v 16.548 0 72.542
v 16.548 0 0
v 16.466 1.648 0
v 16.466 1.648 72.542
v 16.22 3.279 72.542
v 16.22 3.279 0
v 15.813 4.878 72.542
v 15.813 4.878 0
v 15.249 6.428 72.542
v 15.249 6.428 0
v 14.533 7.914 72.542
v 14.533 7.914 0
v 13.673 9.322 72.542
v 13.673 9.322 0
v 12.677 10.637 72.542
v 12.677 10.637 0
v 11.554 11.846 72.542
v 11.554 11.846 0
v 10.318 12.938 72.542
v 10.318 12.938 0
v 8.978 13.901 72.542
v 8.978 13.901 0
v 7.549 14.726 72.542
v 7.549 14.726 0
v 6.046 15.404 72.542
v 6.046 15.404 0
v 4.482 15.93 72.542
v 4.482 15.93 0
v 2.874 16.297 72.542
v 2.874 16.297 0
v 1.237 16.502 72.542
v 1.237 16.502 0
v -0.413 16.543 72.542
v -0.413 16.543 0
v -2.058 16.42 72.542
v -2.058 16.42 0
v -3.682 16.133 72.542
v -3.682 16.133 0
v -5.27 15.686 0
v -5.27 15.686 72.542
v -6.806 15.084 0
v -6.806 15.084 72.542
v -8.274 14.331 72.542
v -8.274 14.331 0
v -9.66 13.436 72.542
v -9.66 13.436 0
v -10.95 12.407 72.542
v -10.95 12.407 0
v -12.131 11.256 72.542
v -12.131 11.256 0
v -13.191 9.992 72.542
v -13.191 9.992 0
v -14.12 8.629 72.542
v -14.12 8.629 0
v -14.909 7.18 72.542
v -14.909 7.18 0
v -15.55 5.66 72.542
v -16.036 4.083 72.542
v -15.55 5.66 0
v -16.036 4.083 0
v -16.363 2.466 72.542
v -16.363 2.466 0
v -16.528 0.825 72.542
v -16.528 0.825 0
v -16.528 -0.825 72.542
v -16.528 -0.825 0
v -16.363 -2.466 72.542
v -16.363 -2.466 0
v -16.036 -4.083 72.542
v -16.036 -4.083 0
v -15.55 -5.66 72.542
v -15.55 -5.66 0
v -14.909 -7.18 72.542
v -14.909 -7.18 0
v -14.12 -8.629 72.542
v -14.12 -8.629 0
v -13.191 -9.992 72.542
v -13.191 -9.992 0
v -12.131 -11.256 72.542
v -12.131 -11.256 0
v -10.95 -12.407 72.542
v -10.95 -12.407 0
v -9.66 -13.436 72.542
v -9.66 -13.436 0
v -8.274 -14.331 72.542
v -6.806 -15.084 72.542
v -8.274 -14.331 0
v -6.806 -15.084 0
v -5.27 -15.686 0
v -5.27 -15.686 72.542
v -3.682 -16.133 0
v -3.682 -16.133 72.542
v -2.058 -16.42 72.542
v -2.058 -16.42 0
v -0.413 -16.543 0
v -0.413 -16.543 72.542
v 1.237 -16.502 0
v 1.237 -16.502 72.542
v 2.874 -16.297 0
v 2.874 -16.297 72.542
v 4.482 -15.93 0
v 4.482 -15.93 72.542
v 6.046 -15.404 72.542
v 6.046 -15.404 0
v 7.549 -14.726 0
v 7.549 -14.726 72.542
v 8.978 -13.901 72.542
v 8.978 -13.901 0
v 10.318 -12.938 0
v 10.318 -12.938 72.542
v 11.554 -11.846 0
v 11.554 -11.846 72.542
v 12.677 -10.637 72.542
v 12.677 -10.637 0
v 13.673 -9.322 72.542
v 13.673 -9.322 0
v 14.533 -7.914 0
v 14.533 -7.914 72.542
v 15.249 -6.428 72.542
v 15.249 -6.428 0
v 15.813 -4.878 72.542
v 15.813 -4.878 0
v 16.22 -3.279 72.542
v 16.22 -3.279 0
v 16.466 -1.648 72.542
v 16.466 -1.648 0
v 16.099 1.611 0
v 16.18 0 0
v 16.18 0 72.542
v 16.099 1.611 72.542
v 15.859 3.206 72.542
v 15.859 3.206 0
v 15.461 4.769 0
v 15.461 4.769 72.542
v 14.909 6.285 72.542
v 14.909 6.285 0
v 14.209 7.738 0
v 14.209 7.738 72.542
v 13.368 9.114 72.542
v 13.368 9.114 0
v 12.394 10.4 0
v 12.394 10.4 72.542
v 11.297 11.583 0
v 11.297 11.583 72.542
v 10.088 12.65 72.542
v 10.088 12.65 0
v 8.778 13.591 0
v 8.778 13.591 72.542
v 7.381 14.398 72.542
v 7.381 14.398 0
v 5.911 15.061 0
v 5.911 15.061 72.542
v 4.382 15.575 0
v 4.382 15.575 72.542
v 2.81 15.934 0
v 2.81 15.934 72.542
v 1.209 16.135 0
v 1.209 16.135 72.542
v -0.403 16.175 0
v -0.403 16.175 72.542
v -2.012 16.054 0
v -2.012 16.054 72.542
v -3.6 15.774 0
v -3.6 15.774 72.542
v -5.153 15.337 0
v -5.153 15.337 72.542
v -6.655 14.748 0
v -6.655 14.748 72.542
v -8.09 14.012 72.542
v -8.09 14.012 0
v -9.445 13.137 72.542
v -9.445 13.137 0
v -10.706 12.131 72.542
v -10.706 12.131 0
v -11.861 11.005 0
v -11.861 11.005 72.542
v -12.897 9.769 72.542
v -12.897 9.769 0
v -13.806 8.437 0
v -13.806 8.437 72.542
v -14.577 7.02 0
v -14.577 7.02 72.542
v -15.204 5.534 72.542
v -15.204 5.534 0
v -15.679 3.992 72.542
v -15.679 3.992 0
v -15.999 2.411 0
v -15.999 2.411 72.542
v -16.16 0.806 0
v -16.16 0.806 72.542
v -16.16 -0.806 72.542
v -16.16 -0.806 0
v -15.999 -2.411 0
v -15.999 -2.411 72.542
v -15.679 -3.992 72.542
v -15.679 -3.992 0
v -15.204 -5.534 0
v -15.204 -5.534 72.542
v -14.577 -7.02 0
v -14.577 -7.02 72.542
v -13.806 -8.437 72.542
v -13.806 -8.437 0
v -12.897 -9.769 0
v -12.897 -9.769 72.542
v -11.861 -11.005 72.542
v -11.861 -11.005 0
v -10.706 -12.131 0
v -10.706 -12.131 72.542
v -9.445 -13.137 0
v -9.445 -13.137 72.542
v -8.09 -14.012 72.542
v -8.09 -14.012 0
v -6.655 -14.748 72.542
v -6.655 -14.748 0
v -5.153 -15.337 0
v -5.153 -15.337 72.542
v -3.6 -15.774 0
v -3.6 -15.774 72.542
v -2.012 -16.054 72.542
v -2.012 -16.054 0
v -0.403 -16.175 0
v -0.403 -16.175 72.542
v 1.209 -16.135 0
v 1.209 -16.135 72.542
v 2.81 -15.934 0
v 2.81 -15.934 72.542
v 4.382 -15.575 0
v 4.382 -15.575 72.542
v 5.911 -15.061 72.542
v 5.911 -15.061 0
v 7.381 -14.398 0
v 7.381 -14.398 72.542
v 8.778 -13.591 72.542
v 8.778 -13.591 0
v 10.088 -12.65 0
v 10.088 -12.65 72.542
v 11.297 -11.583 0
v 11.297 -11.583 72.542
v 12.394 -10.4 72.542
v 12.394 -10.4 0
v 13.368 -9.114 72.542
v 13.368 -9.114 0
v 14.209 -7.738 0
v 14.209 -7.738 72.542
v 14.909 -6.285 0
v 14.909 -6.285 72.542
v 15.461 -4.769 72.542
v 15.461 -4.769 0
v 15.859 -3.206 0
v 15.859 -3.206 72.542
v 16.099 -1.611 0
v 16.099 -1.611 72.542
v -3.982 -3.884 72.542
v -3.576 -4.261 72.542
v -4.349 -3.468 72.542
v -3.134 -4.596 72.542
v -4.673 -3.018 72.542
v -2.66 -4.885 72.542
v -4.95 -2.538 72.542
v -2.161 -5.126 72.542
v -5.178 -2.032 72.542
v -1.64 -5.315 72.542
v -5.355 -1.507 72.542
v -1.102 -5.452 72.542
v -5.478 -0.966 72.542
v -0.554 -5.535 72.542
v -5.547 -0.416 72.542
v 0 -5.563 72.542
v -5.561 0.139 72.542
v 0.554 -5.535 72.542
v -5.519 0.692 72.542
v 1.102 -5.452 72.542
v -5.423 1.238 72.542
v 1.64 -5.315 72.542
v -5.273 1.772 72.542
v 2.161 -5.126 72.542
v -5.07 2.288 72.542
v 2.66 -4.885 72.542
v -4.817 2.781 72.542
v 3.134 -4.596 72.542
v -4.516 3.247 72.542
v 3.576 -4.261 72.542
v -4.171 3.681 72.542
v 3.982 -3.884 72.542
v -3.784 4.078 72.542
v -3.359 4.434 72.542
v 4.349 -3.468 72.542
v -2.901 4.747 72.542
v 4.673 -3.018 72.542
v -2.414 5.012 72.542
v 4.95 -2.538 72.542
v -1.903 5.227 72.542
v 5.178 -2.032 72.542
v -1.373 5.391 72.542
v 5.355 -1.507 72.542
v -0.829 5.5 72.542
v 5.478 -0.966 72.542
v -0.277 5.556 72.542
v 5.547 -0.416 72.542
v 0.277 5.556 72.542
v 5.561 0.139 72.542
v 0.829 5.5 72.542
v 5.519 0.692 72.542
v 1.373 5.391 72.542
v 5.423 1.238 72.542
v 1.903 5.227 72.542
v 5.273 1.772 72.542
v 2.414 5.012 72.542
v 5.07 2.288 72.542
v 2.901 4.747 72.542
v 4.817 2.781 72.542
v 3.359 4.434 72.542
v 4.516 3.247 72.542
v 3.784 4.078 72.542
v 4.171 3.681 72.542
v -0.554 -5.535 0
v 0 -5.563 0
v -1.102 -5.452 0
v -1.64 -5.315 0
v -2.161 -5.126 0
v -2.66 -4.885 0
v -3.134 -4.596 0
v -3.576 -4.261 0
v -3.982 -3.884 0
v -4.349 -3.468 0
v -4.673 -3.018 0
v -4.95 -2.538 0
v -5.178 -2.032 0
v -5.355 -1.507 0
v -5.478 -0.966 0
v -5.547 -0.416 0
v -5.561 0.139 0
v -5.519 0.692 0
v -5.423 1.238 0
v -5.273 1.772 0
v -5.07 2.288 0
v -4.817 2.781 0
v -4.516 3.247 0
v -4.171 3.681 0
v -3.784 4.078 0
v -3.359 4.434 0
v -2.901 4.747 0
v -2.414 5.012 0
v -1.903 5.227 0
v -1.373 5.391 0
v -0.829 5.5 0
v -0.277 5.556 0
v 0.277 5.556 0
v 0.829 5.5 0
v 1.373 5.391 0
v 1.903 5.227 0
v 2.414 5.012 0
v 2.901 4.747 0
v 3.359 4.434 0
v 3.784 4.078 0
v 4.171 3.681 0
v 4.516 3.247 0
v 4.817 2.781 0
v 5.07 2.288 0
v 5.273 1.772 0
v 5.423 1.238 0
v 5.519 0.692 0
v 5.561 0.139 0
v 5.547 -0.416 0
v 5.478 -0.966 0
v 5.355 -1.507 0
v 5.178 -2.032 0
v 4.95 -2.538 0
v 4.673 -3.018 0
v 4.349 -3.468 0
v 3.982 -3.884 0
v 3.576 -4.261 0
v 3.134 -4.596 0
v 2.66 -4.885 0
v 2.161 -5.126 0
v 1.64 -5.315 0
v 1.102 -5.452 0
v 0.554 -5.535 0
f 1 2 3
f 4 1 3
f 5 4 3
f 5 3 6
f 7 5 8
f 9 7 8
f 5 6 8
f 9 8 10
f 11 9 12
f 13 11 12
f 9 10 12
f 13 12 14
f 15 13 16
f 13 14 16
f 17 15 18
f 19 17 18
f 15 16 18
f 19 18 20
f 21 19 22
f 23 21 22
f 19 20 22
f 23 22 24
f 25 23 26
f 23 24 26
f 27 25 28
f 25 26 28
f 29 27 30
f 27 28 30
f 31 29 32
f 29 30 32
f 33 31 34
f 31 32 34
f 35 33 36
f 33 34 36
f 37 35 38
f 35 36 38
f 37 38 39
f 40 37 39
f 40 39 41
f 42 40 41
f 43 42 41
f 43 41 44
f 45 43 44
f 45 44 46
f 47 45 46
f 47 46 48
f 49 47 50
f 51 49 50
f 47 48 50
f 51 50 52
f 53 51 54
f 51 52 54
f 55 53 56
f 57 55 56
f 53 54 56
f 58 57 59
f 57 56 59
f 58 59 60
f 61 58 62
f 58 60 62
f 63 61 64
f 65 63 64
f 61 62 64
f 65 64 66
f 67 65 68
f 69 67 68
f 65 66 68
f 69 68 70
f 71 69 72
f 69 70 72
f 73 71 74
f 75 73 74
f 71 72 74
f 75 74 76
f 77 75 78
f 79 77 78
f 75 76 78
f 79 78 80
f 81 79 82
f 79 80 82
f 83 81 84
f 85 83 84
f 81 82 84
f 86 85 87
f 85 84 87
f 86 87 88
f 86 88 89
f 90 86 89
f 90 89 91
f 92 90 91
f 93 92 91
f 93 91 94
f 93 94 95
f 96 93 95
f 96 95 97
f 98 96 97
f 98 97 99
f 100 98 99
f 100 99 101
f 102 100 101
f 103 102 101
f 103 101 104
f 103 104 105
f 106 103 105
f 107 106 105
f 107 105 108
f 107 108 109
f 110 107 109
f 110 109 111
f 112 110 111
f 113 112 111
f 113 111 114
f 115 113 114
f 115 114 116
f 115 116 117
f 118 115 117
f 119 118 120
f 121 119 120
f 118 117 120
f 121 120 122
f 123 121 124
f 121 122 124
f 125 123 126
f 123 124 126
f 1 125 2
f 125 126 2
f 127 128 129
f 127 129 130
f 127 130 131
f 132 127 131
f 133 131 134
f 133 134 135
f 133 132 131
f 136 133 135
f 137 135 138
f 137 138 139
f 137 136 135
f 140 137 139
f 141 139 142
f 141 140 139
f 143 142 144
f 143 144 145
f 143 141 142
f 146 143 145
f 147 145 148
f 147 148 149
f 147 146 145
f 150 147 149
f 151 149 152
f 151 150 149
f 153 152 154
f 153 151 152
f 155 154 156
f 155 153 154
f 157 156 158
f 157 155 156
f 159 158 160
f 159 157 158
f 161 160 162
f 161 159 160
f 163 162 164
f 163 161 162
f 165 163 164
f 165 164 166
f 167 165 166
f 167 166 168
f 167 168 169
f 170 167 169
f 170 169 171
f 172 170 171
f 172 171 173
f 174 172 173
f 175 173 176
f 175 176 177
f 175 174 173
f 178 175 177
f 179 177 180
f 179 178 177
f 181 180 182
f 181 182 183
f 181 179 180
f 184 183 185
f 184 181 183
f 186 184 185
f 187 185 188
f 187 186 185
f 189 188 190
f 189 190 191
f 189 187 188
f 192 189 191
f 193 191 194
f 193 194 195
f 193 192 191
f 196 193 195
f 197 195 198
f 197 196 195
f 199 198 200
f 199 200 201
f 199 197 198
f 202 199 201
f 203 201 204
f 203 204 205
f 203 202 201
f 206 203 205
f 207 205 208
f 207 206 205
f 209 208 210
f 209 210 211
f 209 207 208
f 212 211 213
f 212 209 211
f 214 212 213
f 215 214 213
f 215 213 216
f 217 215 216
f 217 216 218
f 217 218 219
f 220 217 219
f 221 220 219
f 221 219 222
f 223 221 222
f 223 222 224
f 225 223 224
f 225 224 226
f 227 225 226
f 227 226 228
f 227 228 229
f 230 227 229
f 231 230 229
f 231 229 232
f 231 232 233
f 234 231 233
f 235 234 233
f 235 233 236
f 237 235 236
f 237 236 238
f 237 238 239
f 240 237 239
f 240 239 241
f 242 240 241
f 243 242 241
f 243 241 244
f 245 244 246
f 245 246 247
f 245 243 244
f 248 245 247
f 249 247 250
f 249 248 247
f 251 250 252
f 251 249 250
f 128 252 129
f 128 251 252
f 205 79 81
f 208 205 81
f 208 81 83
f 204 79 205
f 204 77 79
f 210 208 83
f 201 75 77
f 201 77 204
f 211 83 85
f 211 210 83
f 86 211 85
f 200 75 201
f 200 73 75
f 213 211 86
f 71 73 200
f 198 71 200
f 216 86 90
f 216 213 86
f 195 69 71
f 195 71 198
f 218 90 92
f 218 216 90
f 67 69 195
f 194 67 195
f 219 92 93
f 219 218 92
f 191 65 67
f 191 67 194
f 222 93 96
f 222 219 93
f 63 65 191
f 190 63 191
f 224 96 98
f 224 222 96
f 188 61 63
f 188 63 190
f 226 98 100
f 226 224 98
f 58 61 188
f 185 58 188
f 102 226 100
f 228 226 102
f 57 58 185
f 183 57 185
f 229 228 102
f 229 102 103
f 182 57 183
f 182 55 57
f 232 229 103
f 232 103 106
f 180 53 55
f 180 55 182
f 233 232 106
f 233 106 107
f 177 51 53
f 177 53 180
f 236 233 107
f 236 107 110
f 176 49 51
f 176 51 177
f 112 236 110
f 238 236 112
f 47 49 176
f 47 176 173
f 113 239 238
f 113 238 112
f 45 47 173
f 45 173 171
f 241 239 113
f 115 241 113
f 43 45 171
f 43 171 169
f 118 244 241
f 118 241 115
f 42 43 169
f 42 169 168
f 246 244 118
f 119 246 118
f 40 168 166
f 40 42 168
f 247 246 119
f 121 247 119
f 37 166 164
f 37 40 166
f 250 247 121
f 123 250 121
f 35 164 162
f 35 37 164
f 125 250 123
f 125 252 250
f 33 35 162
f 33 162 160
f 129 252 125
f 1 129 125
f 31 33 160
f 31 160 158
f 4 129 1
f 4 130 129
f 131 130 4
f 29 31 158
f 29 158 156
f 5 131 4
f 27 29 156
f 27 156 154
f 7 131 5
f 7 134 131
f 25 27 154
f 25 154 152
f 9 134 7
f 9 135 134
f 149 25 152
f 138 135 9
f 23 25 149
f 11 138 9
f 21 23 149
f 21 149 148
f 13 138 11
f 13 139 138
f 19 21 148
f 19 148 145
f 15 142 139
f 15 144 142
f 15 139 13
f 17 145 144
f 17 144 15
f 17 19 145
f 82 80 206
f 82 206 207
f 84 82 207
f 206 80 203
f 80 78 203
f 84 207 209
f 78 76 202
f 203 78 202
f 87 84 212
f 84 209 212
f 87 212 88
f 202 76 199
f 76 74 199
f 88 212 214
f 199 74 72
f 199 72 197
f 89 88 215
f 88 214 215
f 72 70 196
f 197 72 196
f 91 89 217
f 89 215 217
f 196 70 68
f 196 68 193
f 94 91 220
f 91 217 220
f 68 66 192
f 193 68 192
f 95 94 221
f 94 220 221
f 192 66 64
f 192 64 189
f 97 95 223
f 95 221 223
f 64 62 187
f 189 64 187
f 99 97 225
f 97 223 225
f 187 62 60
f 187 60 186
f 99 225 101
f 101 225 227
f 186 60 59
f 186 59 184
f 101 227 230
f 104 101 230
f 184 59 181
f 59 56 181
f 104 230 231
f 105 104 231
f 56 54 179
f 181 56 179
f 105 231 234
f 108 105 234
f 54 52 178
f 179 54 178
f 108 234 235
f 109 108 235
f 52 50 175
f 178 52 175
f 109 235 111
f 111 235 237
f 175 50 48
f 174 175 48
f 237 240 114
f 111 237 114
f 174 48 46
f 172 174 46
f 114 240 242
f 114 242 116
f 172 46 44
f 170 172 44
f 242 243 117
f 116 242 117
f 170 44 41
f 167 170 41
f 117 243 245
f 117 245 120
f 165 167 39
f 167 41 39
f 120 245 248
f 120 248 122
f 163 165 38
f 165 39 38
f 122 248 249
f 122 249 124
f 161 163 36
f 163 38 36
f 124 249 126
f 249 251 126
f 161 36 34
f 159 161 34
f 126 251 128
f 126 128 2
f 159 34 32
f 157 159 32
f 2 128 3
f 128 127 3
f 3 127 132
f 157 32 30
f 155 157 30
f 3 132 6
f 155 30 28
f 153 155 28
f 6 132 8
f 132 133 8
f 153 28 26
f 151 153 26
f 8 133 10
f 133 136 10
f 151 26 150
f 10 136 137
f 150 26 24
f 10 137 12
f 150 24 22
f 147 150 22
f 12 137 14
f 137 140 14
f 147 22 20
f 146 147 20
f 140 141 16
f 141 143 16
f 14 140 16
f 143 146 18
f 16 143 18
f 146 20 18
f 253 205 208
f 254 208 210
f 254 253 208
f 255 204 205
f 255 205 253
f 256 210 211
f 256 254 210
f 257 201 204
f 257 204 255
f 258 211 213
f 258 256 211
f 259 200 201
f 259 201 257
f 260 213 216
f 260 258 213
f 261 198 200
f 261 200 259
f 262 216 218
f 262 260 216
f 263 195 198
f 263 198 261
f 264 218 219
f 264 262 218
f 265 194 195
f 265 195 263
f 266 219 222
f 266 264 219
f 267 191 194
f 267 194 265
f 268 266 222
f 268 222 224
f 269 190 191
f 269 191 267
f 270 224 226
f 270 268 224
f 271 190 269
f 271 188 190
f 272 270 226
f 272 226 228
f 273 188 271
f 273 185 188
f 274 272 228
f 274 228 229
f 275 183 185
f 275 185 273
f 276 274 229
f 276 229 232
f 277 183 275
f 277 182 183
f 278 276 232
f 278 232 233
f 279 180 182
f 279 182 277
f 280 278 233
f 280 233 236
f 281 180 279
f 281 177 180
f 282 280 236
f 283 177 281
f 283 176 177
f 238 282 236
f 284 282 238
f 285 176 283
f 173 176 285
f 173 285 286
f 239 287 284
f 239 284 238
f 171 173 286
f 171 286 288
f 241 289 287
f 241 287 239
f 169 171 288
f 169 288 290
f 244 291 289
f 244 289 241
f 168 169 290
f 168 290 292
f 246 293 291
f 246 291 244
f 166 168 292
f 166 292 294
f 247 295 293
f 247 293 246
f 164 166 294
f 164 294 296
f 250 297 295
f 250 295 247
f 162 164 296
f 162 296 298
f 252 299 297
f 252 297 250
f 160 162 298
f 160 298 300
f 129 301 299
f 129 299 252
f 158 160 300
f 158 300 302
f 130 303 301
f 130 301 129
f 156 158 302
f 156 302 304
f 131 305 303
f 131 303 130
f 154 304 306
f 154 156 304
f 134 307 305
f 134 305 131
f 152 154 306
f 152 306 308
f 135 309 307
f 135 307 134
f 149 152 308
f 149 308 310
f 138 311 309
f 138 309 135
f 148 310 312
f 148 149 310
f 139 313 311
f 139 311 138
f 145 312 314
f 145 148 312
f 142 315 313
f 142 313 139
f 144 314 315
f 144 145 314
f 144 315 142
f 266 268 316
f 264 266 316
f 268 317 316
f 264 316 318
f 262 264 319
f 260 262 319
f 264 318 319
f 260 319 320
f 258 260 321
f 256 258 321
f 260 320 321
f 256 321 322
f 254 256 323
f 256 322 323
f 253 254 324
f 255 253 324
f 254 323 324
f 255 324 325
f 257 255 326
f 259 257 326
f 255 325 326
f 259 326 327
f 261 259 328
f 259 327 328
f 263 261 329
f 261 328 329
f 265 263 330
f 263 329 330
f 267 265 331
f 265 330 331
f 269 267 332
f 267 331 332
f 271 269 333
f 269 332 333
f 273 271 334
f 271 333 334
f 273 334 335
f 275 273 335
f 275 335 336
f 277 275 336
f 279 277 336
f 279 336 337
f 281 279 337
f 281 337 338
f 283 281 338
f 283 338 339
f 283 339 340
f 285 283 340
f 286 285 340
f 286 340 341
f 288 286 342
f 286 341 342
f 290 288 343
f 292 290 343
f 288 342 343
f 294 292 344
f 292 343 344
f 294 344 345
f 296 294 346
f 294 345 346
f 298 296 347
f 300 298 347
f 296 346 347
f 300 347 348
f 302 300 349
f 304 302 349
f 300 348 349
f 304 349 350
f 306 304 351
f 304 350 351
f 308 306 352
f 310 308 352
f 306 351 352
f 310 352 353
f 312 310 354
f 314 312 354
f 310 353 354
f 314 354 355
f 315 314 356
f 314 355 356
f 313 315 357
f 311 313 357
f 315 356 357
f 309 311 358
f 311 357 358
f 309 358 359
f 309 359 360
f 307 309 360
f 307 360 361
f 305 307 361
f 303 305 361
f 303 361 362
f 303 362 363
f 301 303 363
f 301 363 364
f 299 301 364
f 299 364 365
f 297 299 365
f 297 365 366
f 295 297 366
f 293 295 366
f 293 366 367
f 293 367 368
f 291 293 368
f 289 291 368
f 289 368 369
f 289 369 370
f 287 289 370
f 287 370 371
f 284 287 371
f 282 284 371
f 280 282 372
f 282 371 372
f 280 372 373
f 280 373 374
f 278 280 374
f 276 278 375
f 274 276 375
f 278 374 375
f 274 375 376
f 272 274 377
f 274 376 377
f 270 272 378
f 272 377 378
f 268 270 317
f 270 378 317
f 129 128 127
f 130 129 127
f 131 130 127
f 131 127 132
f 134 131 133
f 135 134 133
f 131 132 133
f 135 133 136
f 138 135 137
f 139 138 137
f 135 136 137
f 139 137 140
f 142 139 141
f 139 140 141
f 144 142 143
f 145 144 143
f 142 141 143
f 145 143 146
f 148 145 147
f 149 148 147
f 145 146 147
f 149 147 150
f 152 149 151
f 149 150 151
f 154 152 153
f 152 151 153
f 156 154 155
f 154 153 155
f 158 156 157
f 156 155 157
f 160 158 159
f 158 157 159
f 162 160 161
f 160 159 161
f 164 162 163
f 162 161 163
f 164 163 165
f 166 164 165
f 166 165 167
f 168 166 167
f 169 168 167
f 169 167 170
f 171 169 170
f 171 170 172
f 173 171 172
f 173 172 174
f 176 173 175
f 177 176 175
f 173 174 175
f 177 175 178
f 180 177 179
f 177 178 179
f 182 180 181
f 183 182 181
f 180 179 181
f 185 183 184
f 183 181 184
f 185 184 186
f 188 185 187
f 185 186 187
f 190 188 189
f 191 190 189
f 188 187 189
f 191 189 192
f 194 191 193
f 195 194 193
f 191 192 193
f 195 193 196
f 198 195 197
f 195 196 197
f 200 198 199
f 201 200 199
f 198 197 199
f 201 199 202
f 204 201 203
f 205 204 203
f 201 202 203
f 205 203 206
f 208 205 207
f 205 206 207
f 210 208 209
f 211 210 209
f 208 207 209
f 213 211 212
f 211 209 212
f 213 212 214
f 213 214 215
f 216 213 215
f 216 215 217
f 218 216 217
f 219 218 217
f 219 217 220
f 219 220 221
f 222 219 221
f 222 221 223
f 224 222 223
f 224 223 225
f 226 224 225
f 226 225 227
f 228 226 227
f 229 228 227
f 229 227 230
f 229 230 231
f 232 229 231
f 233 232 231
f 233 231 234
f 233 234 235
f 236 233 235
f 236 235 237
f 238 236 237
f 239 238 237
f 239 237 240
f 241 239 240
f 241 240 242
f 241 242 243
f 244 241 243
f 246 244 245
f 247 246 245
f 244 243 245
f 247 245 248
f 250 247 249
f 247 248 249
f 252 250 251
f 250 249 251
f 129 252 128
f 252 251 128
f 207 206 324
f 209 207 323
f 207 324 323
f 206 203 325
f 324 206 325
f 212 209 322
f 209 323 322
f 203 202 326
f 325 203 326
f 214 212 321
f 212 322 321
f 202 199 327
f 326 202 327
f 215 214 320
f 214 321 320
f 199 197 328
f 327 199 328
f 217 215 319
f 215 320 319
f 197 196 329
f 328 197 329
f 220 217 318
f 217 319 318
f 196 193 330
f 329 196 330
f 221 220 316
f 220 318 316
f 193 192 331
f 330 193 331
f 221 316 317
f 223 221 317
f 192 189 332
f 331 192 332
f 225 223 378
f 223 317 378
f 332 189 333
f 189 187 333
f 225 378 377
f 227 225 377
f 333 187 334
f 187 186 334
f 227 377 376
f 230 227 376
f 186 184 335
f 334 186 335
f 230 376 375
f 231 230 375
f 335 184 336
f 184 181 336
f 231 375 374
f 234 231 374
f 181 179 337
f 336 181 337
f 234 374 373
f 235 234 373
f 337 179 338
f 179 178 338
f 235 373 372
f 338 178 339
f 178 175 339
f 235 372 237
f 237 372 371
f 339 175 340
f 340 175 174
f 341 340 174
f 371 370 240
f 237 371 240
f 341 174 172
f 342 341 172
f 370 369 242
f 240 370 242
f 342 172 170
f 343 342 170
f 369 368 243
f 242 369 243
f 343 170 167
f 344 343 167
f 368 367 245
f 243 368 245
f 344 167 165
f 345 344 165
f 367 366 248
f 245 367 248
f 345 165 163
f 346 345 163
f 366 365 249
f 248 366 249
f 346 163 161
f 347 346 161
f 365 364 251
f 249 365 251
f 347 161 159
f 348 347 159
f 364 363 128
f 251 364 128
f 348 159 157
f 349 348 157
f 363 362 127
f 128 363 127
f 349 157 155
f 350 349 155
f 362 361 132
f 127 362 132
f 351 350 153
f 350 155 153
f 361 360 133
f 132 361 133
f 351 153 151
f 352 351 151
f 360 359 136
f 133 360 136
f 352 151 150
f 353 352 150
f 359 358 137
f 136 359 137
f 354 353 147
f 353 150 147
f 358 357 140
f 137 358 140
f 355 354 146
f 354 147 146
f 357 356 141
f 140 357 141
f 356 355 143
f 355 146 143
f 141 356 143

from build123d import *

# Parameters (mm, degrees)
SKETCH1_R           = 16.5481
SKETCH1_R_2         = 16.1798
BOSS_EXTRUDE1_DEPTH = 72.5424
SKETCH2_R           = 16.1798
BOSS_EXTRUDE2_DEPTH = 72.5424
SKETCH4_W           = 5.5626
SKETCH4_H           = 72.5424


with BuildPart() as part:
    # Sketch1 → Boss-Extrude1 (new body)
    with BuildSketch(Plane.XY):
        Circle(SKETCH1_R)
        Circle(SKETCH1_R_2, mode=Mode.SUBTRACT)
    extrude(amount=BOSS_EXTRUDE1_DEPTH)


with BuildPart() as body_2:
    # Sketch2 → Boss-Extrude2 (new body)
    with BuildSketch(Plane.XY):
        Circle(SKETCH2_R)
    extrude(amount=BOSS_EXTRUDE2_DEPTH)

    # Sketch4 → 7/16 (0.438) Diameter Hole1 (revolve, cut)
    with BuildSketch(Plane(origin=(0, 0, 72.5424), x_dir=(0, -1, 0), z_dir=(1, 0, 0))):
        with Locations((2.7813, 36.2712)):
            Rectangle(SKETCH4_W, SKETCH4_H)
    revolve(axis=Axis((0, 0, 78.8924), (0, 0, -1)), mode=Mode.SUBTRACT)


solid = Compound([part.part, body_2.part])
